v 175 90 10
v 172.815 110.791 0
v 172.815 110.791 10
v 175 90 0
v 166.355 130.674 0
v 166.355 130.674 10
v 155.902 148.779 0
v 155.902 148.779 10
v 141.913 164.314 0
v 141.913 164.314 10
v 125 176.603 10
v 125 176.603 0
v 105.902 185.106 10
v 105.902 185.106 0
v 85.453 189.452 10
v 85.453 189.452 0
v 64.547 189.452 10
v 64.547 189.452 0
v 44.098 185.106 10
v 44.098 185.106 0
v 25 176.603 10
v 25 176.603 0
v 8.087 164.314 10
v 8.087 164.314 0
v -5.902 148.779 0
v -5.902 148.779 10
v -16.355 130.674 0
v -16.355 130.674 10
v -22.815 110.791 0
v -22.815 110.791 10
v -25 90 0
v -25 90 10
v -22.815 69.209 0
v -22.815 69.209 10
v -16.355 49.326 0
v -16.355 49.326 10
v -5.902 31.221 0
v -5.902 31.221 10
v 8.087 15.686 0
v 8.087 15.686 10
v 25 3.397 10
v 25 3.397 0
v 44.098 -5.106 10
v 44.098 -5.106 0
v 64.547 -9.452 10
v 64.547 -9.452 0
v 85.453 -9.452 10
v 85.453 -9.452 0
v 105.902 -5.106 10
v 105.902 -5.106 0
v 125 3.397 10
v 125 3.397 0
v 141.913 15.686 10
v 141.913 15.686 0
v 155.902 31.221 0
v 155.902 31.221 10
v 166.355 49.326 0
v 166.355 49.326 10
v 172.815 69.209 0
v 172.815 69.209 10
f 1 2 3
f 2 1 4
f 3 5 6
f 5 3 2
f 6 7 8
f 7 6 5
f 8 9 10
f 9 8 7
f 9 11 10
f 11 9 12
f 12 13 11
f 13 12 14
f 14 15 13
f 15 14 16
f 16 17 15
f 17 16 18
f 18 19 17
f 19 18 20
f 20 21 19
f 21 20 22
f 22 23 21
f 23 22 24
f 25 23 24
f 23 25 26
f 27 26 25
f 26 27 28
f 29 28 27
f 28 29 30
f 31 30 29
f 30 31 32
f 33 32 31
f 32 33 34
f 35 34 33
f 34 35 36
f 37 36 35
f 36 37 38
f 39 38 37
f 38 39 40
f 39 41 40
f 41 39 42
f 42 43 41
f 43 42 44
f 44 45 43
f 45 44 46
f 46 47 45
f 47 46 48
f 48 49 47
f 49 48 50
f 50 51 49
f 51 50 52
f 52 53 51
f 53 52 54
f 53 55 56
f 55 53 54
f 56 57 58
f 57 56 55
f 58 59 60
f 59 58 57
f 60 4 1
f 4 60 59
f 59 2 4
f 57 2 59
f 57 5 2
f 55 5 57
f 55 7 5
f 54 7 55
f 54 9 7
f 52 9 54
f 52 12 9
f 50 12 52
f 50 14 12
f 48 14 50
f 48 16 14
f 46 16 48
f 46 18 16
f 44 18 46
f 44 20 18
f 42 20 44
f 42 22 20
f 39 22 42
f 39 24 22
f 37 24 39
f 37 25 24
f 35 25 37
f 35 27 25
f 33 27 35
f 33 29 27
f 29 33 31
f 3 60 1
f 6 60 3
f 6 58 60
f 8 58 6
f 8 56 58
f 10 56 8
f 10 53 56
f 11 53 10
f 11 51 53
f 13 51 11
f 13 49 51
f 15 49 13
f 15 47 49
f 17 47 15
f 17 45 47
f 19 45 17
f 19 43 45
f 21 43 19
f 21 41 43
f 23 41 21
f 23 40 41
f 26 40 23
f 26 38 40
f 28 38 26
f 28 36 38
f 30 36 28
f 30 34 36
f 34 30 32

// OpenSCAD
union(){
translate([0,0,10]) linear_extrude(file = "parasite.dxf", height = 20, center = true);
translate([75,90,0]) cylinder(h = 10, r=100);
}
